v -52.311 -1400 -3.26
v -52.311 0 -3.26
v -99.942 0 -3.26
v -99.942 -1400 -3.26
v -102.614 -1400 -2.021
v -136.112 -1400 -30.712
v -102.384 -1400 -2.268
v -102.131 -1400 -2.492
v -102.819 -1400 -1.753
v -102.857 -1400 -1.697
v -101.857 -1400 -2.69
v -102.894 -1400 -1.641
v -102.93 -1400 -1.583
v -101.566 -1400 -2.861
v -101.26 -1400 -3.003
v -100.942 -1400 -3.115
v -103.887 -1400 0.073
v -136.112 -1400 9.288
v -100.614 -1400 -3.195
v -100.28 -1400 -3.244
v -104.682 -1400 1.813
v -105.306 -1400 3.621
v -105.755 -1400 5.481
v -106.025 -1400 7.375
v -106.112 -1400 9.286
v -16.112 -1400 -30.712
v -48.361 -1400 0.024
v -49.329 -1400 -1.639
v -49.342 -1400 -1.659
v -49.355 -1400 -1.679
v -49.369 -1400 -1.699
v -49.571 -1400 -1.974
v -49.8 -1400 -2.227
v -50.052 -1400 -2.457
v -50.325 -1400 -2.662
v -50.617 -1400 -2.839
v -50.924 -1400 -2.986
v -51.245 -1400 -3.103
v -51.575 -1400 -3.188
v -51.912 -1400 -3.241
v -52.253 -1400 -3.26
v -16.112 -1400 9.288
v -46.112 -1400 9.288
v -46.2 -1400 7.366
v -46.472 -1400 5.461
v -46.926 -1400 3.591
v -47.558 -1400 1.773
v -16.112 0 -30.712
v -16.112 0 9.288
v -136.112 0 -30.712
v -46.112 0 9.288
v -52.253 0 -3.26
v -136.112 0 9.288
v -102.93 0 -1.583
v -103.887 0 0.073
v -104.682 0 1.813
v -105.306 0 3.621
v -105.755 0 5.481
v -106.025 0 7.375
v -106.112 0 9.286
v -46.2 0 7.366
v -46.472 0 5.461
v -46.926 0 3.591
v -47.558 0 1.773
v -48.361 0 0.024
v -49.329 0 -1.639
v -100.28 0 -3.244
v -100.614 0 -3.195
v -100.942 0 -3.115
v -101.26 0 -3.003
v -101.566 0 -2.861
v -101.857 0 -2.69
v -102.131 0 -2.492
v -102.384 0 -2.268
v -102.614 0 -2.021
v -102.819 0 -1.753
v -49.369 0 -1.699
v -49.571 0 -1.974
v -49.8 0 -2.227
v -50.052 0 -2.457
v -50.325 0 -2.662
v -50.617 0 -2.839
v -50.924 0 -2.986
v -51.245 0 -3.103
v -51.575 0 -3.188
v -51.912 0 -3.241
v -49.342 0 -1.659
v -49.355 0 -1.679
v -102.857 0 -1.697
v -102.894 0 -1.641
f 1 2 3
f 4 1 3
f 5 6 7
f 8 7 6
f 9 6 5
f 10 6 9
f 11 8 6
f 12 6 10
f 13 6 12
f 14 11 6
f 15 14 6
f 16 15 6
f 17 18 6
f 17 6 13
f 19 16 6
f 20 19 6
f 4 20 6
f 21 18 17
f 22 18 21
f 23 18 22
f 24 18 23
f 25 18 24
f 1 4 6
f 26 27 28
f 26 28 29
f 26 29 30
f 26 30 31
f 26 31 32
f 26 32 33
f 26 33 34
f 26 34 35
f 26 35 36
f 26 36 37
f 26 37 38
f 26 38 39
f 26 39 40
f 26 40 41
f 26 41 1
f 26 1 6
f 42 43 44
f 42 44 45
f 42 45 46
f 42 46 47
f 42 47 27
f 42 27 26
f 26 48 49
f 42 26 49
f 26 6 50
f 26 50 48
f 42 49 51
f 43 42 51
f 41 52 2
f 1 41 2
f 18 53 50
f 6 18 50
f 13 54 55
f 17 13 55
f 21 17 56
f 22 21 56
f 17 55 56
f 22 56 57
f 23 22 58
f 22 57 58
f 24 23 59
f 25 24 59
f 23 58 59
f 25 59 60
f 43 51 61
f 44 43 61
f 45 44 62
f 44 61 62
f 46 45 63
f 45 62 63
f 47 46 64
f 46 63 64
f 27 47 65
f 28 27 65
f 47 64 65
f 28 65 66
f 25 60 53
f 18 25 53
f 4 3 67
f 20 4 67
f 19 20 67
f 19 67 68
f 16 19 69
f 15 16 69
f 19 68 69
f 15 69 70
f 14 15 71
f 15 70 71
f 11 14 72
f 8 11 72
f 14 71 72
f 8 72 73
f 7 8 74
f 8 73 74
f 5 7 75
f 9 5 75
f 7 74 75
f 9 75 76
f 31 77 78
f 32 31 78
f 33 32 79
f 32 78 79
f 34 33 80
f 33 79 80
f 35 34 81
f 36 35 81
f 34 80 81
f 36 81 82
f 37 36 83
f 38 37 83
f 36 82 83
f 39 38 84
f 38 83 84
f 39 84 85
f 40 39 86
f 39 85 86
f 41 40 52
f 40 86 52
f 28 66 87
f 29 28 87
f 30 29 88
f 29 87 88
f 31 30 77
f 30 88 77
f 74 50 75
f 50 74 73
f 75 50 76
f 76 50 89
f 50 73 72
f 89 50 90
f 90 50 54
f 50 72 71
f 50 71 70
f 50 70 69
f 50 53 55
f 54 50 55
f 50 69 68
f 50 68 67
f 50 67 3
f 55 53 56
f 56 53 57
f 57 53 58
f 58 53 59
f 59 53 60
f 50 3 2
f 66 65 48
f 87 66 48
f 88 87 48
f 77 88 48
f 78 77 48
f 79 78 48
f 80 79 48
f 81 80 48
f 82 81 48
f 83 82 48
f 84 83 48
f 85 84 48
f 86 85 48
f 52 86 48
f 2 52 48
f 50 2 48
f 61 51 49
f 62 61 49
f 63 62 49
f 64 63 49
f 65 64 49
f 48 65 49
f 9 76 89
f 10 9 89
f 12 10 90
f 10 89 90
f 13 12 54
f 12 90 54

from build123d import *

# Parameters (mm, degrees)
F1_DEPTH = 1400


# Not quite as in the source:
# - ends of sketch curves that miss each other by under 0.0002 mm in the source are joined


with BuildPart() as f1:
    # F0 (on Front) → F1 (new body)
    with BuildSketch(Plane.XZ):
        with BuildLine():
            ThreePointArc((-102.8194582262, -1.753334156), (-102.8759917705, -1.6691495307), (-102.9300627594, -1.5833624634))
            ThreePointArc((-102.9300627594, -1.5833624634), (-105.3062912412, 3.621474375), (-106.1115923498, 9.2861260008))
            Line((-106.1115923498, 9.2861260008), (-136.111652, 9.288465))
            Line((-136.111652, 9.288465), (-136.111652, -30.711535))
            Line((-136.111652, -30.711535), (-16.111652, -30.711535))
            Line((-16.111652, -30.711535), (-16.111652, 9.288465))
            Line((-16.111652, 9.288465), (-46.111705, 9.288465))
            ThreePointArc((-46.111705, 9.288465), (-46.9260256459, 3.5907327912), (-49.3292641557, -1.6391538962))
            ThreePointArc((-49.3292641557, -1.6391538962), (-49.348739835, -1.6694199812), (-49.3685261016, -1.6994839384))
            ThreePointArc((-49.3685261016, -1.6994839384), (-50.6166534947, -2.8386108222), (-52.2530199988, -3.2601991421))
            Line((-52.2530199988, -3.2601991421), (-52.3114330011, -3.260199))
            Line((-52.3114330011, -3.260199), (-99.942409, -3.260199))
            ThreePointArc((-99.942409, -3.260199), (-101.566297382, -2.8606806598), (-102.8194582262, -1.753334156))
        make_face()
    extrude(amount=F1_DEPTH)


solid = f1.part
